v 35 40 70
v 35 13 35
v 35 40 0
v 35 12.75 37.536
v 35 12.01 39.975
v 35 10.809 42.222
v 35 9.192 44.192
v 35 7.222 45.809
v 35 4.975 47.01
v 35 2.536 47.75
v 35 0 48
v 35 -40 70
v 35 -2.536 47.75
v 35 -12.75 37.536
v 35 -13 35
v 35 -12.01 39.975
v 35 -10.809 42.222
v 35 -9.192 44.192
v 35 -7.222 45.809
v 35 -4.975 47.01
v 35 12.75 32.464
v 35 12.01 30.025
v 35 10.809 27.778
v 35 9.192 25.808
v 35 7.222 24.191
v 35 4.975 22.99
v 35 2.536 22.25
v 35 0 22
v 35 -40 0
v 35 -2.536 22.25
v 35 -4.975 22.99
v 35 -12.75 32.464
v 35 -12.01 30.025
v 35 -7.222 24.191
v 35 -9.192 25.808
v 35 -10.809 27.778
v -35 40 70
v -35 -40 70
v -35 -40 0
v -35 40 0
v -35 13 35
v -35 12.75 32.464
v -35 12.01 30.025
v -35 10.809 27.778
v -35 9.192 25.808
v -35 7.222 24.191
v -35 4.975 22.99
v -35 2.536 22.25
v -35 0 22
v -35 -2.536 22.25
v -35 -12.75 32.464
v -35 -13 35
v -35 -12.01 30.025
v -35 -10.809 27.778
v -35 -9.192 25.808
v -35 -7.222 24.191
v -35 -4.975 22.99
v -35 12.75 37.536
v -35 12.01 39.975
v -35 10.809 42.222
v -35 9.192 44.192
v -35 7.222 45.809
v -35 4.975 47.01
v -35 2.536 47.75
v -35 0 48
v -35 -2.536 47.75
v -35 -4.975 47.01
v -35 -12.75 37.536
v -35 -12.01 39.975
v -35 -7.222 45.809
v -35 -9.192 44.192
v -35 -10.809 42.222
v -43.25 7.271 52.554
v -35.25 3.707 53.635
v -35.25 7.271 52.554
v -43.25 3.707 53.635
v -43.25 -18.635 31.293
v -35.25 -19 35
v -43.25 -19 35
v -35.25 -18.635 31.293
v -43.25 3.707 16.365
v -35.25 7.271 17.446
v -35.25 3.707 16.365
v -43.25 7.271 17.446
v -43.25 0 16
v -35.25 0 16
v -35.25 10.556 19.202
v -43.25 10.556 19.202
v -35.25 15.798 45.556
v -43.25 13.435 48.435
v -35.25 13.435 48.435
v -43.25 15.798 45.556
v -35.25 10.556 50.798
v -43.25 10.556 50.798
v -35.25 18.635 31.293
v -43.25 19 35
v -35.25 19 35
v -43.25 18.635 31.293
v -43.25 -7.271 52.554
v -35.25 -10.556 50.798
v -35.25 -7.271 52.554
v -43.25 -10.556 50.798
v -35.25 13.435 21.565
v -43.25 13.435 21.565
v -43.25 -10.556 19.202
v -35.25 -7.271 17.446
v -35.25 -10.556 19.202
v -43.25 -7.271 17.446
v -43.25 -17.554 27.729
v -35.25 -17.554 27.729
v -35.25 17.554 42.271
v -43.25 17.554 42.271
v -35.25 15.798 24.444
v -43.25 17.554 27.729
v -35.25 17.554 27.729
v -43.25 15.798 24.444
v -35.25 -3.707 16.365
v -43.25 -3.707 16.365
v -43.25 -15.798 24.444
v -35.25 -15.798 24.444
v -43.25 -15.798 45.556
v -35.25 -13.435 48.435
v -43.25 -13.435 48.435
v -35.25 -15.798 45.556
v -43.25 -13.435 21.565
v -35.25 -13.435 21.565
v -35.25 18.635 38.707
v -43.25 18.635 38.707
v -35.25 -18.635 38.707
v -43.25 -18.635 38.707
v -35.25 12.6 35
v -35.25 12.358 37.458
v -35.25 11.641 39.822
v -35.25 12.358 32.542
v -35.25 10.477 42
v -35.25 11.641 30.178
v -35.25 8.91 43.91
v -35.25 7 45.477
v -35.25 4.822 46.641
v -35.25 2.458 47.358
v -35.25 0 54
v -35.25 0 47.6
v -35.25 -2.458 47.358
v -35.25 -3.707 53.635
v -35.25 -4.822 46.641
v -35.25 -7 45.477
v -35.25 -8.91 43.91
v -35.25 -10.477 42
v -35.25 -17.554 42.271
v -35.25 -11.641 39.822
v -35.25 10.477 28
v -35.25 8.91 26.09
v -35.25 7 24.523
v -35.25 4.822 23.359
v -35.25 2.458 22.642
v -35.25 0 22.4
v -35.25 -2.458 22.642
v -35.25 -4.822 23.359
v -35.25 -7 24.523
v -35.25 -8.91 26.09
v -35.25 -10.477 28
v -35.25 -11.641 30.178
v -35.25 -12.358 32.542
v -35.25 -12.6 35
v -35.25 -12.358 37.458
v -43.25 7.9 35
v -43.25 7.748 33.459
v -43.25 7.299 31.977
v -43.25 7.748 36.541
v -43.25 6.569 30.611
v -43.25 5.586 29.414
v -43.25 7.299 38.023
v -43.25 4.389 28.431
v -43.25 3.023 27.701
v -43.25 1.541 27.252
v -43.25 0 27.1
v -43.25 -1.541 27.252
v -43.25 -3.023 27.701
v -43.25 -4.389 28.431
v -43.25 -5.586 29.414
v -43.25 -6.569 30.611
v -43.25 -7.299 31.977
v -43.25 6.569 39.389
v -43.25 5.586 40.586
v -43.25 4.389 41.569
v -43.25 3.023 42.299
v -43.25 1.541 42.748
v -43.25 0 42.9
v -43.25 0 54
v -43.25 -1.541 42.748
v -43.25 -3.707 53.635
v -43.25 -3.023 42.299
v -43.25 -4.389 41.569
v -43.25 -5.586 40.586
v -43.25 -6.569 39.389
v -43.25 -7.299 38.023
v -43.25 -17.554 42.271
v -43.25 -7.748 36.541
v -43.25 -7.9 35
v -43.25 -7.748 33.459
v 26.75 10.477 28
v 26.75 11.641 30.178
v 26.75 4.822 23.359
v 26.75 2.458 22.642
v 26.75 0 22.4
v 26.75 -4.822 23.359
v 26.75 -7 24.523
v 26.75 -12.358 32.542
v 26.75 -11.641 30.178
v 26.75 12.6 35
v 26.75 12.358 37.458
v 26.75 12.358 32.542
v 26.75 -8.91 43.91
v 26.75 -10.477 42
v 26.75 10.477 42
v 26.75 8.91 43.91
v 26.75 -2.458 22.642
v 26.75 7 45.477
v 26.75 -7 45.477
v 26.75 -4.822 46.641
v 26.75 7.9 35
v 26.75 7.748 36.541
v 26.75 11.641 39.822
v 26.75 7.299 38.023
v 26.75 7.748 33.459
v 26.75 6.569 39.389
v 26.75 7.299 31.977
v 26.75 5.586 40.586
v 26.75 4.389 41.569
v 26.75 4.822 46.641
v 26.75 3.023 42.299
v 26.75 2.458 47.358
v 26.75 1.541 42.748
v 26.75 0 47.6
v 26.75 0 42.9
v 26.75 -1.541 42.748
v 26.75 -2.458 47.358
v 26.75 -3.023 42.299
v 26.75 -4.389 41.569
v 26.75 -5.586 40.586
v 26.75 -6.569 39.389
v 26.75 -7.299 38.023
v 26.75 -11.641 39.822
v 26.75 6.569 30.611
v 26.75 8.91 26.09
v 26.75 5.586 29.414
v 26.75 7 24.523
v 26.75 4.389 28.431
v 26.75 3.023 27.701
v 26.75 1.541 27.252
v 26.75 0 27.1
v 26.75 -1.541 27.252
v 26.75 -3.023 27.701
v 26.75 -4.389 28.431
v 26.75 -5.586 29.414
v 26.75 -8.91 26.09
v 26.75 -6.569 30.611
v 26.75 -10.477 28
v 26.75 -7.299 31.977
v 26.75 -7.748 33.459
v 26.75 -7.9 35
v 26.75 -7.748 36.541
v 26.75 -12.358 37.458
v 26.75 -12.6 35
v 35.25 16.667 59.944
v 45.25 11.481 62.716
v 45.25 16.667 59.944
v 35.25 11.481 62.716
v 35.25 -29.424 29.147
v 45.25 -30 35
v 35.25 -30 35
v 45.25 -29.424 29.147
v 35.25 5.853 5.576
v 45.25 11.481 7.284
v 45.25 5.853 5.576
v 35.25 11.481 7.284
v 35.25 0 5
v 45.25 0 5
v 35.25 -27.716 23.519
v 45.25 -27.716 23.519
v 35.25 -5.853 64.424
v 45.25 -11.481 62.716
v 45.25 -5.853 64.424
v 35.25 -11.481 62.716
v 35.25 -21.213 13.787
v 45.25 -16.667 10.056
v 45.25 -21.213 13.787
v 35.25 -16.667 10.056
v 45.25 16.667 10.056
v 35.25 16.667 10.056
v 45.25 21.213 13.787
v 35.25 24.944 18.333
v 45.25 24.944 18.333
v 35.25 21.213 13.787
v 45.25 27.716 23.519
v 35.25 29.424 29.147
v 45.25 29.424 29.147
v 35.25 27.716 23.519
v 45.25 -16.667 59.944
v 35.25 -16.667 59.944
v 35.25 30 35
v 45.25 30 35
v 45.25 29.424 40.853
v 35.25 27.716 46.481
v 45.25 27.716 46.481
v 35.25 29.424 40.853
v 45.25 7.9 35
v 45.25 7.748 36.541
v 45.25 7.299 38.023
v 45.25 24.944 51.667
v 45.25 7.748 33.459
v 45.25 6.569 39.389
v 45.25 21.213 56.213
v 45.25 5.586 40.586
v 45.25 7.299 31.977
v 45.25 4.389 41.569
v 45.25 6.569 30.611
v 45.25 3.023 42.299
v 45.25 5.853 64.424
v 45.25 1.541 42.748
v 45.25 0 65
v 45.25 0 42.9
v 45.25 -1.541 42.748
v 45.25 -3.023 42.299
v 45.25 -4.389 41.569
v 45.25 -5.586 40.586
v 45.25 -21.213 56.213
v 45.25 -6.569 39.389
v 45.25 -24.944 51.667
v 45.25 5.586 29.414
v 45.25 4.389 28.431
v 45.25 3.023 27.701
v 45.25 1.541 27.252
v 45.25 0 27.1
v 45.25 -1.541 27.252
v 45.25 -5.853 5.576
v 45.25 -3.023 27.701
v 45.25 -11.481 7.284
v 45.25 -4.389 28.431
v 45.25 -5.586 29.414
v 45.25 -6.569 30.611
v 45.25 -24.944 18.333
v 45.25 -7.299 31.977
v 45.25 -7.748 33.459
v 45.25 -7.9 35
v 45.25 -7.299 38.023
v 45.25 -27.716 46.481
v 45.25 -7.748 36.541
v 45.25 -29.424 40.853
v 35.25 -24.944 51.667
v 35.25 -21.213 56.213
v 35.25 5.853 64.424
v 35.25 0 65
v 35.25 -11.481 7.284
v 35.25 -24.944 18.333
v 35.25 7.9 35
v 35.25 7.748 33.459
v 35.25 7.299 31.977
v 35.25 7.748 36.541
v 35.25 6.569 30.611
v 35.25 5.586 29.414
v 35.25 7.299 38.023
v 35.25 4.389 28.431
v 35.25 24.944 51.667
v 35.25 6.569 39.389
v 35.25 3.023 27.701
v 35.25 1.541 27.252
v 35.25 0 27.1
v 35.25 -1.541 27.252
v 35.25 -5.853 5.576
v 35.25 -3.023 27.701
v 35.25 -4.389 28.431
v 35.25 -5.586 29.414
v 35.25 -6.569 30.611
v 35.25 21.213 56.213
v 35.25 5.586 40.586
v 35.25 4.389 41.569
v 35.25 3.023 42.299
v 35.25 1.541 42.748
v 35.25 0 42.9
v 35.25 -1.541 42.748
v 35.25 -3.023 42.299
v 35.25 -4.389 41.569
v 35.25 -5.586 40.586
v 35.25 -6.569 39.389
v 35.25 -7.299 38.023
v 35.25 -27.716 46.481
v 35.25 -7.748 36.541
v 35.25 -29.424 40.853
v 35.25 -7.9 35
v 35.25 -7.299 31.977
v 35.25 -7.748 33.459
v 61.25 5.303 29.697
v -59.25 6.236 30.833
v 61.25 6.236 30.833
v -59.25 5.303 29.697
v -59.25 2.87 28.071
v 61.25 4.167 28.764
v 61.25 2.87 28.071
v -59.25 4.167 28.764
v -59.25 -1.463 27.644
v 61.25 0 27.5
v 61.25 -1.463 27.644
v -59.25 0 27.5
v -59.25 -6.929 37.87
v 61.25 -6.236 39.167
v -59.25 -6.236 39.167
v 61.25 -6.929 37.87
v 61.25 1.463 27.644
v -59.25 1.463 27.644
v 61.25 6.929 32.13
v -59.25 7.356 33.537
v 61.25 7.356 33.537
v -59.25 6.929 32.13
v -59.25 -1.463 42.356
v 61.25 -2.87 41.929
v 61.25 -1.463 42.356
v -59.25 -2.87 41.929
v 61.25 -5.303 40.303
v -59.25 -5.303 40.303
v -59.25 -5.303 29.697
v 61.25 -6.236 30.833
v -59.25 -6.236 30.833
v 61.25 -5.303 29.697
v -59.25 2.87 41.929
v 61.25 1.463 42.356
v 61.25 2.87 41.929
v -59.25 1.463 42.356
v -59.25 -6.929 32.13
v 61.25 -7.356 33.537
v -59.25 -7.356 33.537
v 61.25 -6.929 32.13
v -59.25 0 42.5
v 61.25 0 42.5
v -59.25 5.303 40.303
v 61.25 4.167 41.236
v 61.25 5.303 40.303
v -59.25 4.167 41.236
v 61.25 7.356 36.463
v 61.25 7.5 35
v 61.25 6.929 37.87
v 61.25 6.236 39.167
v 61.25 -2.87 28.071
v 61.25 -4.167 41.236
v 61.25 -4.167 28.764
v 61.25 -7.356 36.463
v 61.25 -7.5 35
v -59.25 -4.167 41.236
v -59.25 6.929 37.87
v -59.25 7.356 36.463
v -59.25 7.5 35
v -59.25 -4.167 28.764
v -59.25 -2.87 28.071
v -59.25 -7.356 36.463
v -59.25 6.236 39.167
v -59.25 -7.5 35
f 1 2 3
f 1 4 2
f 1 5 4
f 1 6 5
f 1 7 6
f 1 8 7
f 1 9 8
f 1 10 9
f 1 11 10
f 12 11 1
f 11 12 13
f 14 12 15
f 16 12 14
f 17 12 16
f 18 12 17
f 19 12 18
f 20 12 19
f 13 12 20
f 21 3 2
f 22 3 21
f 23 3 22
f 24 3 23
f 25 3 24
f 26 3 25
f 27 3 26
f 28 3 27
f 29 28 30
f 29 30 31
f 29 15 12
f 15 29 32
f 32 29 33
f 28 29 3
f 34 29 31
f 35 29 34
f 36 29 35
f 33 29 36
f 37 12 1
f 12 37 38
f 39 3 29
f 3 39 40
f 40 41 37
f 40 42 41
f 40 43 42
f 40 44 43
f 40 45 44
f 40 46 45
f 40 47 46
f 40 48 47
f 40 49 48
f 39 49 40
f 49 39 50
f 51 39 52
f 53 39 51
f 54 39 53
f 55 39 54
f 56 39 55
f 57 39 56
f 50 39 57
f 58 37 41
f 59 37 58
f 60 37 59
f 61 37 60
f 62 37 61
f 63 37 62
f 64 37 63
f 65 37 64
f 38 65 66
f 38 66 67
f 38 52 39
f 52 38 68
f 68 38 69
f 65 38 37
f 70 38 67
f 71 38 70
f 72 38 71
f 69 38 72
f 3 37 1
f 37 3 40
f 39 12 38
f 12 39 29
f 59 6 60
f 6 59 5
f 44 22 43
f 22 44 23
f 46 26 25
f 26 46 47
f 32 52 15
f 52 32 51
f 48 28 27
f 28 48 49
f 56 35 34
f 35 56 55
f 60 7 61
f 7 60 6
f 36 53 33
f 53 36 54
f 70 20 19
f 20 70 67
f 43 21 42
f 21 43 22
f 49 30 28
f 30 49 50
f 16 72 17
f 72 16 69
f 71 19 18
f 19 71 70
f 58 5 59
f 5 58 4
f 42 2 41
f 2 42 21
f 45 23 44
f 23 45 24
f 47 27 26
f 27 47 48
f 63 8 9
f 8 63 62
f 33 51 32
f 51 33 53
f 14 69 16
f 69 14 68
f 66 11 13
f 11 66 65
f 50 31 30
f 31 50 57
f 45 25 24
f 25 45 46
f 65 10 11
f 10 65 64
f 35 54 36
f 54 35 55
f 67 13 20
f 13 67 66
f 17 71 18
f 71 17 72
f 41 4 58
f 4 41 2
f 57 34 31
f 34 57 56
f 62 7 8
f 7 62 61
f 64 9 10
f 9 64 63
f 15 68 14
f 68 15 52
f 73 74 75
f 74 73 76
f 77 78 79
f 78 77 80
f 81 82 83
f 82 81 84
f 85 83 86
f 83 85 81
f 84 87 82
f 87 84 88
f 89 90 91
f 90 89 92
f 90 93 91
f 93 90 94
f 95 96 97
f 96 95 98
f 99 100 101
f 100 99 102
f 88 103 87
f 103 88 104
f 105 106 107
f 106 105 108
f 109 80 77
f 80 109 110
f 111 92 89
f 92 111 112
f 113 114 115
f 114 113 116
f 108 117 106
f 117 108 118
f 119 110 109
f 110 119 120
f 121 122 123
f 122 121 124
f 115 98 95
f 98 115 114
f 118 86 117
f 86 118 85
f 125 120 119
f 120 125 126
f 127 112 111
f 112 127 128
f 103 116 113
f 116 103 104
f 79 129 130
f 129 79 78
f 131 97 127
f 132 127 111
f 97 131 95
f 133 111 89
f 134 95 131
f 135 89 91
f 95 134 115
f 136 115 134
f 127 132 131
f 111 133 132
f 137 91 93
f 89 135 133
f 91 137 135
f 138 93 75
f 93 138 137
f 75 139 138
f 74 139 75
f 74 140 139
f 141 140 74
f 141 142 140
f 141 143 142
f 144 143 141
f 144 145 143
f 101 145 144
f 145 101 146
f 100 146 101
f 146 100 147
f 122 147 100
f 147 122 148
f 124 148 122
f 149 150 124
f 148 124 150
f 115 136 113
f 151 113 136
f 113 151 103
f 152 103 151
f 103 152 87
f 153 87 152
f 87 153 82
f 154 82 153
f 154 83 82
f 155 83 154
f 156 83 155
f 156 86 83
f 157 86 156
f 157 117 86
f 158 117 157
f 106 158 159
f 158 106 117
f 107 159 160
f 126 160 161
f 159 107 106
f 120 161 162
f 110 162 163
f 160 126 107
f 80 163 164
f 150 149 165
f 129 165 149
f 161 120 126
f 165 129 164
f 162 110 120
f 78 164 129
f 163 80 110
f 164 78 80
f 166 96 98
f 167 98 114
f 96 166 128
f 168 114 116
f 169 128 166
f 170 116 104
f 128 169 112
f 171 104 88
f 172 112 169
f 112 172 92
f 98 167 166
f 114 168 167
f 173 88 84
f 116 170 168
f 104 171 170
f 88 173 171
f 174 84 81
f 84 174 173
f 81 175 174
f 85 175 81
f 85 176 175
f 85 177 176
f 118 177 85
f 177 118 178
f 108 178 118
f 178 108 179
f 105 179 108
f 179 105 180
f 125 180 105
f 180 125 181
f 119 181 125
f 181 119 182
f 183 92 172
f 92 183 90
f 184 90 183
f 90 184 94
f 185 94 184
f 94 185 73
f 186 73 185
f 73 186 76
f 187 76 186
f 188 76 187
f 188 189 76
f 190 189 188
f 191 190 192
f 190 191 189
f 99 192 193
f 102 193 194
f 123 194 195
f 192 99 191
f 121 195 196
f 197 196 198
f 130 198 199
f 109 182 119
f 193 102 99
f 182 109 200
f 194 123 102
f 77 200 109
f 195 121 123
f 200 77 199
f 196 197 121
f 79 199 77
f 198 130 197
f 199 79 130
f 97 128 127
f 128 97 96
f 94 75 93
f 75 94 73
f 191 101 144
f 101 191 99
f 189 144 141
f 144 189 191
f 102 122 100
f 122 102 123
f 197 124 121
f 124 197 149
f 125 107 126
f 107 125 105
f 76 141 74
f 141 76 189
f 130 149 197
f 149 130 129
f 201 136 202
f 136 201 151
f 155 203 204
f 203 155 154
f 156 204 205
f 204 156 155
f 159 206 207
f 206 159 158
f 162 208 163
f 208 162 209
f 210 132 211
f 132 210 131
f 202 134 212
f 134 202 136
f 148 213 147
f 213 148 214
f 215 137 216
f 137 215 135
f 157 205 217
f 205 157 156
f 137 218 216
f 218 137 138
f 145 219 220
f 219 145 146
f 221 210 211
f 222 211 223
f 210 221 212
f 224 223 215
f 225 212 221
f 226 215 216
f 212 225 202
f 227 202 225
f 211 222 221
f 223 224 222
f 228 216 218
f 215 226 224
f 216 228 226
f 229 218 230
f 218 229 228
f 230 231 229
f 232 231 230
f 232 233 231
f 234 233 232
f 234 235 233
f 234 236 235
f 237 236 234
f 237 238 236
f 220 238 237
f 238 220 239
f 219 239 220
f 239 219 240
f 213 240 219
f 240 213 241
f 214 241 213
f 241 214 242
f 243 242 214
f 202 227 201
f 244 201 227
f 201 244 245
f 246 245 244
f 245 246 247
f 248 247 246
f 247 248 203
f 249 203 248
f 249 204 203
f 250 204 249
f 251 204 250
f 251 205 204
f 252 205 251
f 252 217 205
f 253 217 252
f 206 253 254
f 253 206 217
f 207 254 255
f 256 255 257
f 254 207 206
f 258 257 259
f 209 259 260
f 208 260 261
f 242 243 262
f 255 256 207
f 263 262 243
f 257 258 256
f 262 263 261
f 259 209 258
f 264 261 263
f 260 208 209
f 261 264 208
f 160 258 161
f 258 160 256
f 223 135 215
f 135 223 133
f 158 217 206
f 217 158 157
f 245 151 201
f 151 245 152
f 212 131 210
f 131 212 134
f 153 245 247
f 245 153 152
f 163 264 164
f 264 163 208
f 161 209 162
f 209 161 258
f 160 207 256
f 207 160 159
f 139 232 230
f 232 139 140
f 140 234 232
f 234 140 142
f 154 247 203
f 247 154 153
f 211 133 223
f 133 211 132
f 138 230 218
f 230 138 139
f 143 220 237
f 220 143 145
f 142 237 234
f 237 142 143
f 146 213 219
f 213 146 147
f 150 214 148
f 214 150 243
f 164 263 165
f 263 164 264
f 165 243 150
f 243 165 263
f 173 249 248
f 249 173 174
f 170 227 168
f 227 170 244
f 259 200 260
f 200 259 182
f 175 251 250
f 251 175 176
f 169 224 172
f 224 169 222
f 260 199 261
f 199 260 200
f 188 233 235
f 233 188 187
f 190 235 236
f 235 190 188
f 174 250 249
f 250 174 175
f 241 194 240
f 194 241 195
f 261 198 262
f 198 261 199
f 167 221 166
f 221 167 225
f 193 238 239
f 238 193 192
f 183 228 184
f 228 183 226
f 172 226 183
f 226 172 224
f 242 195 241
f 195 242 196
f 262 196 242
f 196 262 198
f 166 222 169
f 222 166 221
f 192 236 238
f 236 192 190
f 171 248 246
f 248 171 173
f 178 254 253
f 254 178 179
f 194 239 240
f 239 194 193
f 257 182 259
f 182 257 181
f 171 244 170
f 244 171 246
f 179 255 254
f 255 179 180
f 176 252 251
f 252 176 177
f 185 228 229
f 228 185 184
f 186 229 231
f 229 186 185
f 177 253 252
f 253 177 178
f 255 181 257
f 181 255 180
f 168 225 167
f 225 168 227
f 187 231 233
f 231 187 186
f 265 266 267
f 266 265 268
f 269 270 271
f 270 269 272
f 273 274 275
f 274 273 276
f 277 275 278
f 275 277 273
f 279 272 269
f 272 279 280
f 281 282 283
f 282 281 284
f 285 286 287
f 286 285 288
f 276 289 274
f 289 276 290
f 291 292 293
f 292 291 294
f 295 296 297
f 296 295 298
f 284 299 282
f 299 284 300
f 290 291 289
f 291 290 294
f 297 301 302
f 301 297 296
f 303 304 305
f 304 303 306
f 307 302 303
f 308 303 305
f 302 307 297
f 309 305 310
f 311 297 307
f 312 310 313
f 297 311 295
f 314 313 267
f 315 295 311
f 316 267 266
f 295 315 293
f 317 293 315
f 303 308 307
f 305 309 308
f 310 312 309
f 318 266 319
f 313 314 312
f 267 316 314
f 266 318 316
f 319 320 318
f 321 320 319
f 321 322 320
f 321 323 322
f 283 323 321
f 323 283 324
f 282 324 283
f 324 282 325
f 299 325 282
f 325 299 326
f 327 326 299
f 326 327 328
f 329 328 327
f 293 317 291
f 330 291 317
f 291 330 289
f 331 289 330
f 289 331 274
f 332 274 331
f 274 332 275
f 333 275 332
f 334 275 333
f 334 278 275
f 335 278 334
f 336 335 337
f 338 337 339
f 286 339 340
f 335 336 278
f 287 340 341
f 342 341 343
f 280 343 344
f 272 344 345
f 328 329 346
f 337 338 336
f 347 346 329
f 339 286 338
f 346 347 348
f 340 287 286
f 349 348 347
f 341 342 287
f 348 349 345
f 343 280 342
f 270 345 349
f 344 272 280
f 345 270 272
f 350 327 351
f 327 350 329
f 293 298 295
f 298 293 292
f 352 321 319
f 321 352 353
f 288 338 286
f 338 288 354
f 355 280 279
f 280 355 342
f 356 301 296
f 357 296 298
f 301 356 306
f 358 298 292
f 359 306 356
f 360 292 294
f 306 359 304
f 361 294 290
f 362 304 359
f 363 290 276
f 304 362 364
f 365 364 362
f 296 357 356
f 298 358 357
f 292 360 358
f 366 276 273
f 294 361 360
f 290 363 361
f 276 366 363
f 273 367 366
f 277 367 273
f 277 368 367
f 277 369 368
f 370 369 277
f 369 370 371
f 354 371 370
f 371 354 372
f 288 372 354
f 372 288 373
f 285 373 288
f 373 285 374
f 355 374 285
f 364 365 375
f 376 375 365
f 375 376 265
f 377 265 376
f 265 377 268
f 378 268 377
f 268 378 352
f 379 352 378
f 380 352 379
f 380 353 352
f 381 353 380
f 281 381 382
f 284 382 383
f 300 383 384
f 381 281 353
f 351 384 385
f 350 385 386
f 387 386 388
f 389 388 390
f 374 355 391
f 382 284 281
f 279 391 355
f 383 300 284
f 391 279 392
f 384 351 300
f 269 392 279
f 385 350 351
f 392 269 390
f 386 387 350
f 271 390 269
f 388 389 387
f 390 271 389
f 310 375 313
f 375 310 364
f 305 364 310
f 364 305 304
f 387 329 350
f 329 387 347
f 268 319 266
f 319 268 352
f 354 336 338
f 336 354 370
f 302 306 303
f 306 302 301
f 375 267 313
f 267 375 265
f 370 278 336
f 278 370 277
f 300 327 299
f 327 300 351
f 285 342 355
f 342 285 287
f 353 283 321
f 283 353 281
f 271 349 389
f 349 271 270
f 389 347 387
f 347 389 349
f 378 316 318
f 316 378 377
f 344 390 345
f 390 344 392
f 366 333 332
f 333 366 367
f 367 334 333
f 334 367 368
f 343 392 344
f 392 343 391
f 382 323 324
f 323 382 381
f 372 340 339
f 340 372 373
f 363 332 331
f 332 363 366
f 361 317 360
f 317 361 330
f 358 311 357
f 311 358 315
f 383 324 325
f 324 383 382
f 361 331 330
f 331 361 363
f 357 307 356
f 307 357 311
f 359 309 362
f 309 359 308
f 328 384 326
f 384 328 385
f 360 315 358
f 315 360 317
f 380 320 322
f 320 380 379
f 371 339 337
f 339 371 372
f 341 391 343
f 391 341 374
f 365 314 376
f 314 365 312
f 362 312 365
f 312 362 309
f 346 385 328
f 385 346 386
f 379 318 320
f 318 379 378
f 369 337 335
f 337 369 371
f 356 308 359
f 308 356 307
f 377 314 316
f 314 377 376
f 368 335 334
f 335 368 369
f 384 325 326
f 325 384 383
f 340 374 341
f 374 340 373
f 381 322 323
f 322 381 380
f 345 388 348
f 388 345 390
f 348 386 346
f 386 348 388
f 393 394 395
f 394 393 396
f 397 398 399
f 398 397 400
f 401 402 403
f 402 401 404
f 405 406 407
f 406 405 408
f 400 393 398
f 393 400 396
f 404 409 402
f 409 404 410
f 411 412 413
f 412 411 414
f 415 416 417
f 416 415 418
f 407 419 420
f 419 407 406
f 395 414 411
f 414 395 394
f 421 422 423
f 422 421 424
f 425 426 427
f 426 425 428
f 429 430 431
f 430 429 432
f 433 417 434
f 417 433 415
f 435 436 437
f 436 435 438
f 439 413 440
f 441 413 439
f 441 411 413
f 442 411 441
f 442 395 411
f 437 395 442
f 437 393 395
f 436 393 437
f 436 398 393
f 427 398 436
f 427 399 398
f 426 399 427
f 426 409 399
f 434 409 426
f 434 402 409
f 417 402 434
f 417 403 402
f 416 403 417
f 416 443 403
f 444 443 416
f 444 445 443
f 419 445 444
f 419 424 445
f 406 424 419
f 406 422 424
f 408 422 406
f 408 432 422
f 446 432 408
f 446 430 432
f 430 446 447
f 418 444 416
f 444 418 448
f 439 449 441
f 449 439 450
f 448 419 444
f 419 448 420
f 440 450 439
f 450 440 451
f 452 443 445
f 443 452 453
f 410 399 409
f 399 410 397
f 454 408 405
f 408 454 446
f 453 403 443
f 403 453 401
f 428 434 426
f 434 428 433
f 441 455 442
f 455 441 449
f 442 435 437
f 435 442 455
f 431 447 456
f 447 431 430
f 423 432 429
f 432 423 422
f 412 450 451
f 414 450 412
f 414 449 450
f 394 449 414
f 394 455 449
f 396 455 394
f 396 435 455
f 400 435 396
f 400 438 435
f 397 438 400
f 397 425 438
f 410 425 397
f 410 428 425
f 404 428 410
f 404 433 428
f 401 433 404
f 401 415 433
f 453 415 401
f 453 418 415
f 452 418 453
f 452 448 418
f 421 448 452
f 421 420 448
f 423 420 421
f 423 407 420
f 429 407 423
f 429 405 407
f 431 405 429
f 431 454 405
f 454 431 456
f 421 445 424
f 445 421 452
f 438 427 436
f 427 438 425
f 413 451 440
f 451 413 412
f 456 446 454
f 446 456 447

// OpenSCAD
$fn = 32;

// ------------------------------------------------------------------------
// Bushed housing: 70 x 80 x 70 mm housing, bushing d25.2
// Every part is its own module, assembly() places them once.
// ------------------------------------------------------------------------

// --- part 1 ---
module housing() {
  difference() {
    translate([-35, -40, 0]) cube([70, 80, 70]);
    translate([0, 0, 35]) rotate([0, 90, 0]) cylinder(h = 72, d = 26, center = true);
  }
}

// --- part 2 ---
module bushing() {
  difference() {
    union() {
      cylinder(h = 8, d = 38);
      translate([0, 0, 8]) cylinder(h = 62, d = 25.2);
    }
    translate([0, 0, -1]) cylinder(h = 72, d = 15.8);
  }
}

// --- part 3 ---
module shaft() {
  translate([0, 0, -60.25]) cylinder(h = 120.5, d = 15);
}

// --- part 4 ---
module cover() {
  difference() {
    cylinder(h = 10, d = 60);
    translate([0, 0, -1]) cylinder(h = 12, d = 15.8);
  }
}

// --- assembly ---
module assembly() {
  translate([0, 0, 0]) rotate([0, 0, 0]) housing();
  translate([-43.25, 0, 35]) rotate([0, 90, 0]) bushing();
  translate([1, 0, 35]) rotate([0, 90, 0]) shaft();
  translate([35.25, 0, 35]) rotate([0, 90, 0]) cover();
}

assembly();
